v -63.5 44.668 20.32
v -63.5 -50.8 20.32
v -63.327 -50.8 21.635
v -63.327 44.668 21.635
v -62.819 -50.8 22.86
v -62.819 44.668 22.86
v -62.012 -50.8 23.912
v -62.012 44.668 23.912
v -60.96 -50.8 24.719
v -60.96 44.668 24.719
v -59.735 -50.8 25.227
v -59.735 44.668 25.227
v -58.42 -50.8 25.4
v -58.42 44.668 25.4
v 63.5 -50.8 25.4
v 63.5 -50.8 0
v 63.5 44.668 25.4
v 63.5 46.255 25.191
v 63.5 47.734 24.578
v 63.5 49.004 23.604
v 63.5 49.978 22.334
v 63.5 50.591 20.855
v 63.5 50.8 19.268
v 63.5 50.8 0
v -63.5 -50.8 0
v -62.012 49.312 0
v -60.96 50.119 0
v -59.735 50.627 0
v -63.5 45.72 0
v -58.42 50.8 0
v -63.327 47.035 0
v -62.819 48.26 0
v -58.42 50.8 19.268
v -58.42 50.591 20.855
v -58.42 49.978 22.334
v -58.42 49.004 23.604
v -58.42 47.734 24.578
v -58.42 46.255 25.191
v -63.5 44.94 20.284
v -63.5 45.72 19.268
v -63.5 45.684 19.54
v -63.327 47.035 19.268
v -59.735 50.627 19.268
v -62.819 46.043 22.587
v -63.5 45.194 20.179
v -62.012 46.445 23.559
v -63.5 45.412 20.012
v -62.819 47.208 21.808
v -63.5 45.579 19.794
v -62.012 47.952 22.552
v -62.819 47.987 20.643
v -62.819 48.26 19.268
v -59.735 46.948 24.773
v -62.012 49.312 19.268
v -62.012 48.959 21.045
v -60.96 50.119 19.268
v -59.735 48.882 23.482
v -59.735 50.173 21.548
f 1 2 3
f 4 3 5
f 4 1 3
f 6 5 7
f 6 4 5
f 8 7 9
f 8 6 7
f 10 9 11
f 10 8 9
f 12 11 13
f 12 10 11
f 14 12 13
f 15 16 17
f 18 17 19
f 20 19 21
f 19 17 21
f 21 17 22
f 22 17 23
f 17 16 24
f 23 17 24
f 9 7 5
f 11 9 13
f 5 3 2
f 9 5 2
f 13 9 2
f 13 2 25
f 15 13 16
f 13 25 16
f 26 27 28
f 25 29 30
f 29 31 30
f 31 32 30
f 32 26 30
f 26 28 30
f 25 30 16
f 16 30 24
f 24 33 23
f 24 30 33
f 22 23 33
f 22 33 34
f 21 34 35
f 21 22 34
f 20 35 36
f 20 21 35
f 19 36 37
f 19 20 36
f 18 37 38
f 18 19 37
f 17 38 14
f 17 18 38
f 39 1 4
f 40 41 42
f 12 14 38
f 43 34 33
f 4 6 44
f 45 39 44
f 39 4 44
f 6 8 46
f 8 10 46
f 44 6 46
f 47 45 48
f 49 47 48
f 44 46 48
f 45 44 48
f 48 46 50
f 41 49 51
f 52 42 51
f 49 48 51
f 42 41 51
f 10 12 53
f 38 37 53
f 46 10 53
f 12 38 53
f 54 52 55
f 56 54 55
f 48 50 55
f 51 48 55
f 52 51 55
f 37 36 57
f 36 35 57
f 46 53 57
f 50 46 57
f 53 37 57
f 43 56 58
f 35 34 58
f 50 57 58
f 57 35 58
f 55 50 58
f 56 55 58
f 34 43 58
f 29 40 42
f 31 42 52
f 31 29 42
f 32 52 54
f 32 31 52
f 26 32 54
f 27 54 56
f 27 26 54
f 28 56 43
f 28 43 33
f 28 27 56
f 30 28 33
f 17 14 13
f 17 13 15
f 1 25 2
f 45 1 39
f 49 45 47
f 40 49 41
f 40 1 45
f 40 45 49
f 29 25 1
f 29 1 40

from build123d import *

# Parameters (mm, degrees)
F0_W     = 127
F0_H     = 101.6
F1_DEPTH = 25.4
F2_R     = 6.132102
F3_R     = 5.08


with BuildPart() as f1:
    # F0 (on Top) → F1 (new body)
    with BuildSketch(Plane.XY):
        Rectangle(F0_W, F0_H)
    extrude(amount=F1_DEPTH)

    # F2
    f2_edges = [f1.edges().sort_by_distance(p)[0] for p in [
        (0, 50.8, 25.4),
    ]]
    fillet(f2_edges, radius=F2_R)

    # F3
    f3_edges = [f1.edges().sort_by_distance(p)[0] for p in [
        (-63.5, -3.066051, 25.4),
    ]]
    fillet(f3_edges, radius=F3_R)


solid = f1.part
